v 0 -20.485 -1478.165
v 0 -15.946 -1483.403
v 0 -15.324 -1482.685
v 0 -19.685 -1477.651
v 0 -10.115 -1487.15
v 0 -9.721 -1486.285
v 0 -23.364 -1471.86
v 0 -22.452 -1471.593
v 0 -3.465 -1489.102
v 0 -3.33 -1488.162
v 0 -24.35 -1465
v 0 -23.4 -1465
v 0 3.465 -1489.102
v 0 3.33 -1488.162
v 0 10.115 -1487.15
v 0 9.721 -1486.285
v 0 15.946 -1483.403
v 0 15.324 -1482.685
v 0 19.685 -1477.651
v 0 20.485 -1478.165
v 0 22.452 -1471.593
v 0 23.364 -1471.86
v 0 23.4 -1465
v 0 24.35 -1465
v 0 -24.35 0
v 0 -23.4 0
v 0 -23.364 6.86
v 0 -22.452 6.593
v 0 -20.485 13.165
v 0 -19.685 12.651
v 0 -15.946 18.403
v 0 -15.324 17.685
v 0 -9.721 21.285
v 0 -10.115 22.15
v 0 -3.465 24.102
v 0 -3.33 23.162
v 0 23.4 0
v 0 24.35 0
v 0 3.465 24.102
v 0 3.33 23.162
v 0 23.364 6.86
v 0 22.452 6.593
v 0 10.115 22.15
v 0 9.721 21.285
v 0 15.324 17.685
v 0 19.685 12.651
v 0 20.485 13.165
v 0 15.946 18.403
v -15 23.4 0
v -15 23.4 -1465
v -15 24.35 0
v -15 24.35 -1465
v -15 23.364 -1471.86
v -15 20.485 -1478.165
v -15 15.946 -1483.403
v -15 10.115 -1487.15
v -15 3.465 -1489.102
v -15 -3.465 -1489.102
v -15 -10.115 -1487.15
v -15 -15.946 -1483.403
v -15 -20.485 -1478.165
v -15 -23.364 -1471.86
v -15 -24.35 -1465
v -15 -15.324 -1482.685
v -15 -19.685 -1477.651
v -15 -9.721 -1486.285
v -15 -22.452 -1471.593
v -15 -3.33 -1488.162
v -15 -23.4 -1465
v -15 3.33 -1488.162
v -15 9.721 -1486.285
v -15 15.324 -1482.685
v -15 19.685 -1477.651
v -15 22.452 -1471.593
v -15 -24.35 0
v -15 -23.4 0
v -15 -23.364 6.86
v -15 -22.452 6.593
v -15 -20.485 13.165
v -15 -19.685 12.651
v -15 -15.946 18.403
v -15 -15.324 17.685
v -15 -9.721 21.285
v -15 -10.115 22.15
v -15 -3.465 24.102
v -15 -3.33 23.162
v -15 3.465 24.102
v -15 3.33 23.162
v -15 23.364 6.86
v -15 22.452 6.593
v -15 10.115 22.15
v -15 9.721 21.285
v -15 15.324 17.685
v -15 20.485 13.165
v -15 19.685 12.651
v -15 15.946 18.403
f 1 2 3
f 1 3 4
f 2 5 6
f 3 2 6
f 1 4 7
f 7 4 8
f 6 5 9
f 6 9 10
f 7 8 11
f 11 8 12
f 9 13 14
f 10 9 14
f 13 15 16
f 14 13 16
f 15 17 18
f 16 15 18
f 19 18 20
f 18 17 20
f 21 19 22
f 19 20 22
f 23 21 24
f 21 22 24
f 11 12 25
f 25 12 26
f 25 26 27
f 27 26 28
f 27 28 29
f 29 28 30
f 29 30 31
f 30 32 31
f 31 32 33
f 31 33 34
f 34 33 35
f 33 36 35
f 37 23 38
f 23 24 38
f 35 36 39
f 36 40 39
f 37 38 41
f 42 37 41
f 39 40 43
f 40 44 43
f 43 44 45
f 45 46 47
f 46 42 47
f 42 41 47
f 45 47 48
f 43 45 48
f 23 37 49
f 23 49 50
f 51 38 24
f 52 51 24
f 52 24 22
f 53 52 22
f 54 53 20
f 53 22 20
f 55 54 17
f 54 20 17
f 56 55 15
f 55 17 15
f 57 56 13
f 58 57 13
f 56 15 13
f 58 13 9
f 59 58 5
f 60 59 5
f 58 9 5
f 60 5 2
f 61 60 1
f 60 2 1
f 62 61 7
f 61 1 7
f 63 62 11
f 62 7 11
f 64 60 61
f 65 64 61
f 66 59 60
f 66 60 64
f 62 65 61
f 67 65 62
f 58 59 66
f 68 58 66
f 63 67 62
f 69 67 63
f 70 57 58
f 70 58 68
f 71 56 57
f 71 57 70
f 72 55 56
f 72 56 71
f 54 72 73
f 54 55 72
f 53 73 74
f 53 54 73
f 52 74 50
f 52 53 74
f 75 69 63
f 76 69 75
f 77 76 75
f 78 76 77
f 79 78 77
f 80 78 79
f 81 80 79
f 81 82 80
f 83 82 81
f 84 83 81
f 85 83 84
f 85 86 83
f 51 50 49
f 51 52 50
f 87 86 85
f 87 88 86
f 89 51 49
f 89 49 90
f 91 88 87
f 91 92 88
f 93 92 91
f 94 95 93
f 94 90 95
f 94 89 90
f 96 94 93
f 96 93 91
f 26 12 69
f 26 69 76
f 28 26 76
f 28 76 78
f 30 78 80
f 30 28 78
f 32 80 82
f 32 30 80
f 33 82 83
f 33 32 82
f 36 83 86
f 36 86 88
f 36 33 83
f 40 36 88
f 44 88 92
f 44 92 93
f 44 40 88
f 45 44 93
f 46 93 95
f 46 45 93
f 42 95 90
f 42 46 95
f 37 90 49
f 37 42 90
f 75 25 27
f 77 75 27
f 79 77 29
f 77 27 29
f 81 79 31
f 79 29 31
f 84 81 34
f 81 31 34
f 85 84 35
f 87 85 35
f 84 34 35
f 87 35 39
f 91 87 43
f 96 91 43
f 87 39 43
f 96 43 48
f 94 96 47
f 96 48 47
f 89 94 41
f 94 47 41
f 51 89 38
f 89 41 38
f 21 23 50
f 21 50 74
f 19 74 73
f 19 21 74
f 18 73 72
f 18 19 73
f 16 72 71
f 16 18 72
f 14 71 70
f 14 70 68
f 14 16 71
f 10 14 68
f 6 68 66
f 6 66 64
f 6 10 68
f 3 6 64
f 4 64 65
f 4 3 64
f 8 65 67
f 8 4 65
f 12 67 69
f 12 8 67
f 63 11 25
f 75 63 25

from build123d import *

# Parameters (mm, degrees)
BOSS_EXTRUDE1_DEPTH = 15


with BuildPart() as part:
    # Sketch1 → Boss-Extrude1 (new body)
    with BuildSketch(Plane(origin=(0, 0, 0), x_dir=(0, 0, -1), z_dir=(1, 0, 0))):
        with BuildLine():
            Line((0, 24.35), (1465, 24.35))
            ThreePointArc((1465, 24.35), (1489.35, 0), (1465, -24.35))
            Line((1465, -24.35), (0, -24.35))
            ThreePointArc((0, -24.35), (-24.35, 0), (0, 24.35))
        make_face()
        with BuildLine():
            Line((0, 23.4), (1465, 23.4))
            ThreePointArc((1465, 23.4), (1488.4, 0), (1465, -23.4))
            Line((1465, -23.4), (0, -23.4))
            ThreePointArc((0, -23.4), (-23.4, 0), (0, 23.4))
        make_face(mode=Mode.SUBTRACT)
    extrude(amount=-BOSS_EXTRUDE1_DEPTH)


solid = part.part
